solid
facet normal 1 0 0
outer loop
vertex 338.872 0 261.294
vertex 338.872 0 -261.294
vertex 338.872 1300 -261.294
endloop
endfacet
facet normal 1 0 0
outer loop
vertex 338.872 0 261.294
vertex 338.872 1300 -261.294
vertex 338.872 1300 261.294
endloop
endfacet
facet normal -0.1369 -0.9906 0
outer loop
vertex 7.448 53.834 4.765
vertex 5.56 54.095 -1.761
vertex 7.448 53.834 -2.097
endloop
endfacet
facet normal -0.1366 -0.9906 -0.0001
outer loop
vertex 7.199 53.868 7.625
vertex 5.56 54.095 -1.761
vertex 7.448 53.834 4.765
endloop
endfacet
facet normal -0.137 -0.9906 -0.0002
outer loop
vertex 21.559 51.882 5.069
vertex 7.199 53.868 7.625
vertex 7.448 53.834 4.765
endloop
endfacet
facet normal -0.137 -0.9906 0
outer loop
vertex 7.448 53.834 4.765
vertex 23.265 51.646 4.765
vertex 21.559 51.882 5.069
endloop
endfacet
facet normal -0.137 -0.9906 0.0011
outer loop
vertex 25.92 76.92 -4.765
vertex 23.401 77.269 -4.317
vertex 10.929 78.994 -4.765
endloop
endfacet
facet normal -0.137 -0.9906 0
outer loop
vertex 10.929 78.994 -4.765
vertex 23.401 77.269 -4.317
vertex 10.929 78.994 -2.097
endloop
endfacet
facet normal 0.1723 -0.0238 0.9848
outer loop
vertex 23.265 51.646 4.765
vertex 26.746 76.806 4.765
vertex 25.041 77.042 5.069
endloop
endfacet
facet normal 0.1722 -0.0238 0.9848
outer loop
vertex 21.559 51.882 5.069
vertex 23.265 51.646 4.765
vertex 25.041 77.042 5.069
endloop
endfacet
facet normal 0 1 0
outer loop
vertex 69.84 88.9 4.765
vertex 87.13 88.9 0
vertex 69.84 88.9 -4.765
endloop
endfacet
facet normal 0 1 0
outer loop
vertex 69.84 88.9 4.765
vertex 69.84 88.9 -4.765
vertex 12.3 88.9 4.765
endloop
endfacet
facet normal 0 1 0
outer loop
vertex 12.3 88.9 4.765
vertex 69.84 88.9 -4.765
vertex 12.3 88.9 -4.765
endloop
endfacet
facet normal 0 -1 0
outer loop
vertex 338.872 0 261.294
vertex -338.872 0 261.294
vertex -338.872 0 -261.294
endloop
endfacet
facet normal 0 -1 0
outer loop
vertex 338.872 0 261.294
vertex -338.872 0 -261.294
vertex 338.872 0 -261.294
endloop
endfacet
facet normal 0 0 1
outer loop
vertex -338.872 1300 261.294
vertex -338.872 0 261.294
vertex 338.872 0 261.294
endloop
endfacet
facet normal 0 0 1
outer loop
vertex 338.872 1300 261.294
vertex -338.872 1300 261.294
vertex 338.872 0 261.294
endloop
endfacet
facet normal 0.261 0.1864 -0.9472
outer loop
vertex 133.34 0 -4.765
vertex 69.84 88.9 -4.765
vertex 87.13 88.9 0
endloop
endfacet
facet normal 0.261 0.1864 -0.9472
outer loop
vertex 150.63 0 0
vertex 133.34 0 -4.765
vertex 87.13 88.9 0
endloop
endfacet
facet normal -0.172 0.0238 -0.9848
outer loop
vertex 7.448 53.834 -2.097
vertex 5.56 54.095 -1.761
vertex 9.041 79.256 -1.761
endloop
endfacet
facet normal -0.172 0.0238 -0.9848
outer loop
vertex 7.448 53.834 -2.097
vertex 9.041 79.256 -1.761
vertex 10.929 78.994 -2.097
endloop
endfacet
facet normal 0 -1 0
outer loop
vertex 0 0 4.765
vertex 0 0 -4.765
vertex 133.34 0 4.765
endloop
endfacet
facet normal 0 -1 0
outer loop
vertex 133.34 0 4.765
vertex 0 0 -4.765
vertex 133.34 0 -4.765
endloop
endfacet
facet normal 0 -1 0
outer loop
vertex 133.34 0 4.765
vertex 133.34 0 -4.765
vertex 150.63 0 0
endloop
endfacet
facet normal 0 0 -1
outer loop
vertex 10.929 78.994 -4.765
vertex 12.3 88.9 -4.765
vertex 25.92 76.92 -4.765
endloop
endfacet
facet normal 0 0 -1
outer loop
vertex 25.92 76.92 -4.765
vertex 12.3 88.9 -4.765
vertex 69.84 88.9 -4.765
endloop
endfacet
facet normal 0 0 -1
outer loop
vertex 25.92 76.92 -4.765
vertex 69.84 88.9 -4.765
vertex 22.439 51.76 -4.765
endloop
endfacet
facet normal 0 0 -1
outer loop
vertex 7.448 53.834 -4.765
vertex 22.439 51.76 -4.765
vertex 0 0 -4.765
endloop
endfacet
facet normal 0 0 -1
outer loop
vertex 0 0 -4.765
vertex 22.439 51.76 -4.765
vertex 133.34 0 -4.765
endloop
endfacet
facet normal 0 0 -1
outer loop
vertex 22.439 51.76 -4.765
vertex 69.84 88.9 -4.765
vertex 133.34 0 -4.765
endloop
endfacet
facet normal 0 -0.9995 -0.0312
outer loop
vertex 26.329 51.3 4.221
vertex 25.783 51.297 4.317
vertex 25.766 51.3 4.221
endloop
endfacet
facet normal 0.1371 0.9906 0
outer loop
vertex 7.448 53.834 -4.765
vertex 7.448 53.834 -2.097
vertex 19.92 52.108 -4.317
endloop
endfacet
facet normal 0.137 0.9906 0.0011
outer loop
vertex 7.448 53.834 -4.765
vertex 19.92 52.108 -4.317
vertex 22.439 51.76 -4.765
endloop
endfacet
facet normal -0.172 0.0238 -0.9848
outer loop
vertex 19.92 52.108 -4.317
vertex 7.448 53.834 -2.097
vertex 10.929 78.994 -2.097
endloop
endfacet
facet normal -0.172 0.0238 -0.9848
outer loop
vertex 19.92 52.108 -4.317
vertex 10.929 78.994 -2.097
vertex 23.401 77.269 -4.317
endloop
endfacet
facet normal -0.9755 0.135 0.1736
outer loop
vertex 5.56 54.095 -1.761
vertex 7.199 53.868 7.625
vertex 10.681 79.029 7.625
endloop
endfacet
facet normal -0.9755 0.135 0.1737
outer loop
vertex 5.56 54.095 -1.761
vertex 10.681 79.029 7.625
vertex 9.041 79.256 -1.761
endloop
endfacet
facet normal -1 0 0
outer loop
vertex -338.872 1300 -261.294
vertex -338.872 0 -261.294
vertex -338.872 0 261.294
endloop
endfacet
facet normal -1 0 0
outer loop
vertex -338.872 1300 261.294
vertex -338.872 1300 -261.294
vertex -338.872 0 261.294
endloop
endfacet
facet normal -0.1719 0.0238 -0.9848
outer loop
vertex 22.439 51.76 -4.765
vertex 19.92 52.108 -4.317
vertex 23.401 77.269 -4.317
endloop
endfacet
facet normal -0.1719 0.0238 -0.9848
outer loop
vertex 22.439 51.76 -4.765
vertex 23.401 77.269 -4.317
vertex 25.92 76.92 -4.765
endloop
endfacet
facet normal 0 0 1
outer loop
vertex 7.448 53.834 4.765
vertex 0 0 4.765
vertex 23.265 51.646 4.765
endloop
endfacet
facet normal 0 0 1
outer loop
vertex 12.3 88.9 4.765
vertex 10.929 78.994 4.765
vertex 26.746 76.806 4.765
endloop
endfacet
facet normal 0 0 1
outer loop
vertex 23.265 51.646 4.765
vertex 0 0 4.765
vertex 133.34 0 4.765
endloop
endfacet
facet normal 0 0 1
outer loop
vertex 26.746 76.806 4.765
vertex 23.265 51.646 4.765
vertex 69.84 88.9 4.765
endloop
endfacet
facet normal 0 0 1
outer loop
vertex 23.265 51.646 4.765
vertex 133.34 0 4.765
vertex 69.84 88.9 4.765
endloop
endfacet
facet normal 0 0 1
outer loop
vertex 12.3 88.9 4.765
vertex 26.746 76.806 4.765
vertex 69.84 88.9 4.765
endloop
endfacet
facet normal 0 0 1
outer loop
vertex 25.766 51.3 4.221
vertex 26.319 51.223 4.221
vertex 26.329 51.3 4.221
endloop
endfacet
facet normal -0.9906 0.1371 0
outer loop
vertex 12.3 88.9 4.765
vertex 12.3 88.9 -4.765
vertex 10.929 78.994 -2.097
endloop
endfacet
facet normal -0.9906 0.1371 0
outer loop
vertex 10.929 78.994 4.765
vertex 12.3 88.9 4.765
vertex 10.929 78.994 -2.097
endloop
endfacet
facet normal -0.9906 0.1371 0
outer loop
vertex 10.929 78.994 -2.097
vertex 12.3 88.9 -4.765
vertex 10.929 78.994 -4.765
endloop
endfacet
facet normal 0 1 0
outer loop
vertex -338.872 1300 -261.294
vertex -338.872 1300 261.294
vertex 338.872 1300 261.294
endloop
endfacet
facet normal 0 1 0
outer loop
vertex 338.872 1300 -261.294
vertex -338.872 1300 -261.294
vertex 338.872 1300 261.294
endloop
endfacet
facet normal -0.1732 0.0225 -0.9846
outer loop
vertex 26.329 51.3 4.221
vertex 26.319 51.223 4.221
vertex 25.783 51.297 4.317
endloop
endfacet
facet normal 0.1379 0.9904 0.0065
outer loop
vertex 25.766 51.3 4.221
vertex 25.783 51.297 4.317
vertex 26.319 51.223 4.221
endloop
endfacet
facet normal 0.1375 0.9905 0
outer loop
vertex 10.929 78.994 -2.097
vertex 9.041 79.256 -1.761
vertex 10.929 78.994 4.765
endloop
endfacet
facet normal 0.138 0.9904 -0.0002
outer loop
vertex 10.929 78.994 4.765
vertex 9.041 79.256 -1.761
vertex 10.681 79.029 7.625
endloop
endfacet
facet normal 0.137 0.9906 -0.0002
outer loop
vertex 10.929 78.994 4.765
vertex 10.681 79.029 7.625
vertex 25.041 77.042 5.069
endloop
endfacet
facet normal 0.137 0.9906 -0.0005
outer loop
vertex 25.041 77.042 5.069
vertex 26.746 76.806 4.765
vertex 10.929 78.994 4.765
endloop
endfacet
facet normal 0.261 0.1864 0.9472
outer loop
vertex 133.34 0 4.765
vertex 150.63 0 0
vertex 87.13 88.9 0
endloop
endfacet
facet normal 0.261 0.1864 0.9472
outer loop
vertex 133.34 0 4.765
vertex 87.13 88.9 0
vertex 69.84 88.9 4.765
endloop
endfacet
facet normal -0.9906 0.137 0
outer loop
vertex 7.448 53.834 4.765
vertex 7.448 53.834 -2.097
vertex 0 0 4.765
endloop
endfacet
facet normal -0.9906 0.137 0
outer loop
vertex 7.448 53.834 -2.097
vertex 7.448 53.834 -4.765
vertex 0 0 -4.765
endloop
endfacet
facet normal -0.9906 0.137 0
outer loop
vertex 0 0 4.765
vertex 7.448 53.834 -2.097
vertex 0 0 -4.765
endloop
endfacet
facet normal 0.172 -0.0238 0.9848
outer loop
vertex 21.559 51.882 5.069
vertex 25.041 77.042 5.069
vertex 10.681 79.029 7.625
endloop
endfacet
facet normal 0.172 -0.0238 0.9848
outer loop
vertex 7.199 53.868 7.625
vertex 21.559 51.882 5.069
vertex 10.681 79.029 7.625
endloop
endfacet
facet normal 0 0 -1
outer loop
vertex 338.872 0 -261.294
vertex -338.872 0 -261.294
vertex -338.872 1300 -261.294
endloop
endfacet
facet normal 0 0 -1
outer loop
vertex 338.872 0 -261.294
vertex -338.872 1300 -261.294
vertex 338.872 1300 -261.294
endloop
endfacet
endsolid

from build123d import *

# Parameters (mm, degrees)
BOSS_EXTRUDE1_DEPTH      = 4.765
BOSS_EXTRUDE1_DEPTH_BACK = 4.765
CUT_EXTRUDE1_DEPTH       = 134.257142857
CUT_EXTRUDE2_DEPTH       = 176.166857025
BOSS_EXTRUDE2_DEPTH      = 25.4
BOSS_EXTRUDE3_REACH      = 168.247
BOSS_EXTRUDE4_REACH      = 162.602
CUT_EXTRUDE4_DEPTH       = 176.073535498
CUT_EXTRUDE4_DEPTH_BACK  = 176.073535498
SKETCH8_W                = 29.497845824
SKETCH8_H                = 11.821808138
BOSS_EXTRUDE5_REACH      = 162.602
SKETCH10_W               = 677.744852518
SKETCH10_H               = 522.587521888
BOSS_EXTRUDE6_DEPTH      = 1300


with BuildPart() as part:
    # Sketch1 → Boss-Extrude1 (new, two sides: drawn at the far end of the back side and taken through both)
    with BuildSketch(Plane.XY.offset(-BOSS_EXTRUDE1_DEPTH_BACK)):
        Polygon((0, 0), (150.63, 0), (87.13, 88.9), (12.3, 88.9), align=None)
    extrude(amount=BOSS_EXTRUDE1_DEPTH + BOSS_EXTRUDE1_DEPTH_BACK)

    # Sketch2 → Cut-Extrude1 (cut, along a direction that is not the sketch's normal)
    with BuildSketch(Plane.XZ):
        Polygon((150.63, 0), (133.34, 4.765), (171.670273927, 17.698707495), (171.005533739, -7.644512157), (148.071997267, -23.348999089), (133.34, -4.765), align=None)
    extrude(amount=-CUT_EXTRUDE1_DEPTH, dir=(0.5812381937190965, -0.8137334712067349, 0), mode=Mode.SUBTRACT)

    # Sketch3 → Cut-Extrude2 (cut, through all)
    with BuildSketch(Plane.XY.offset(4.765)):
        Polygon((29.799719665, 76.3835184), (10.929478609, 78.99436165), (7.448354274, 53.834040242), (26.31859533, 51.223196991), align=None)
    extrude(amount=-CUT_EXTRUDE2_DEPTH, mode=Mode.SUBTRACT)

    # Sketch4 → Boss-Extrude2 (add)
    with BuildSketch(Plane(origin=(10.929478609, 78.99436165, 0), x_dir=(0.9905638349724135, -0.1370521391469141, 0), z_dir=(-0.1370521391469141, -0.9905638349724135, 0))):
        Polygon((-1.906104256, -1.760525647), (0, -2.096623256), (0, 4.765), (14.191997191, 4.765), (14.245516561, 5.068523432), (-0.251237123, 7.624692239), align=None)
        with BuildLine():
            Line((0, -2.096623256), (12.590649428, -4.316694454))
            Line((12.590649428, -4.316694454), (12.940515204, -2.332507041))
            ThreePointArc((12.940515204, -2.332507041), (12.103172864, 0.607768622), (13.895650785, 3.084336019))
            Line((13.895650785, 3.084336019), (14.191997191, 4.765))
            Line((14.191997191, 4.765), (0, 4.765))
            Line((0, 4.765), (0, -2.096623256))
        make_face()
        with BuildLine():
            ThreePointArc((13.895650785, 3.084336019), (12.103172864, 0.607768622), (12.940515204, -2.332507041))
            Line((12.940515204, -2.332507041), (13.895650785, 3.084336019))
        make_face()
        with BuildLine():
            ThreePointArc((12.940515204, -2.332507041), (14.942231378, -3.446827136), (17.204349215, -3.084336019))
            Line((17.204349215, -3.084336019), (18.159484796, 2.332507041))
            ThreePointArc((18.159484796, 2.332507041), (16.157768622, 3.446827136), (13.895650785, 3.084336019))
            Line((13.895650785, 3.084336019), (12.940515204, -2.332507041))
        make_face()
        with BuildLine():
            ThreePointArc((13.895650785, 3.084336019), (16.157768622, 3.446827136), (18.159484796, 2.332507041))
            Line((18.159484796, 2.332507041), (18.509350572, 4.316694454))
            Line((18.509350572, 4.316694454), (15.966883482, 4.765))
            Line((15.966883482, 4.765), (14.191997191, 4.765))
            Line((14.191997191, 4.765), (13.895650785, 3.084336019))
        make_face()
        Polygon((14.245516561, 5.068523432), (14.191997191, 4.765), (15.966883482, 4.765), align=None)
        with BuildLine():
            Line((12.590649428, -4.316694454), (15.133116518, -4.765))
            Line((15.133116518, -4.765), (16.908002809, -4.765))
            Line((16.908002809, -4.765), (17.204349215, -3.084336019))
            ThreePointArc((17.204349215, -3.084336019), (14.942231378, -3.446827136), (12.940515204, -2.332507041))
            Line((12.940515204, -2.332507041), (12.590649428, -4.316694454))
        make_face()
        Polygon((15.133116518, -4.765), (16.854483439, -5.068523432), (16.908002809, -4.765), align=None)
    extrude(amount=BOSS_EXTRUDE2_DEPTH)

    # Boss-Extrude3: up to this plane
    boss_extrude3_end = Plane(origin=(18.870241056, -2.610843251, -4.765), z_dir=(-0.9905638349724135, 0.13705213914691478, 0))
    # Sketch5 → Boss-Extrude3 (add, up to the surface)
    with BuildSketch(Plane(origin=(17.050602168, -2.35908219, -3.035121103), x_dir=(-0.1720096048057269, 0.02379885420821639, -0.9848077530122078), z_dir=(0.9755149445343381, -0.134970009198789, -0.17364817766693175)), mode=Mode.PRIVATE) as boss_extrude3_sk1:
        Polygon((1.756565067, 54.346866241), (2.064770837, 54.346866241), (2.064770837, 79.746866241), (1.756565067, 79.746866241), (-7.465229163, 79.746866241), (-7.465229163, 54.346866241), align=None)
    boss_extrude3_tool1 = split(extrude(boss_extrude3_sk1.sketch, amount=BOSS_EXTRUDE3_REACH, dir=(1, 0, 0), mode=Mode.PRIVATE), bisect_by=boss_extrude3_end, keep=Keep.BOTH, mode=Mode.PRIVATE)
    add(boss_extrude3_tool1.solids().sort_by_distance((26.703984, 63.990856, -0.375914))[0])

    # Boss-Extrude4: up to this face of the body (flat: up to its plane)
    boss_extrude4_end = Plane(part.part.faces().sort_by_distance((18.23182988, 65.163044194, 5.970693347))[0])
    # Sketch6 → Boss-Extrude4 (add, up to the picked face)
    with BuildSketch(Plane(origin=(18.870241056, -2.610843251, 0), x_dir=(0, 0, 1), z_dir=(-0.9905638349724135, 0.1370521391469148, 0)), mode=Mode.PRIVATE) as boss_extrude4_sk1:
        Polygon((4.765, 79.746866241), (4.316694454, 79.746866241), (4.316694454, 54.421669255), (-4.765, 54.643228057), (-4.765, 54.346866241), (4.765, 54.346866241), align=None)
    boss_extrude4_tool1 = split(extrude(boss_extrude4_sk1.sketch, amount=BOSS_EXTRUDE4_REACH, mode=Mode.PRIVATE), bisect_by=boss_extrude4_end, keep=Keep.BOTH, mode=Mode.PRIVATE)
    add(boss_extrude4_tool1.solids().sort_by(Axis((29.762539, 76.114789, 4.540847), (-0.9905638349724135, 0.1370521391469148, 0)))[0])

    # Sketch8 → Cut-Extrude4 (cut, two sides: drawn at the far end of the back side and taken through both)
    with BuildSketch(Plane(origin=(0, 88.9, 0), x_dir=(1, 0, 0), z_dir=(0, 1, 0)).offset(-CUT_EXTRUDE4_DEPTH_BACK)):
        with Locations((33.561006967, 10.675904069)):
            Rectangle(SKETCH8_W, SKETCH8_H)
    extrude(amount=CUT_EXTRUDE4_DEPTH + CUT_EXTRUDE4_DEPTH_BACK, mode=Mode.SUBTRACT)

    # Sketch9 → Boss-Extrude5 (add, up to next)
    with BuildSketch(Plane(origin=(18.870241056, -2.610843251, 0), x_dir=(0, 0, 1), z_dir=(-0.9905638349724135, 0.1370521391469148, 0)), mode=Mode.PRIVATE) as boss_extrude5_sk1:
        Polygon((4.221363373, 54.346866241), (4.221363373, 54.423994971), (-4.765, 54.643228057), (-4.765, 54.346866241), align=None)
    boss_extrude5_tool1 = extrude(boss_extrude5_sk1.sketch, amount=BOSS_EXTRUDE5_REACH, mode=Mode.PRIVATE) - part.part
    add(boss_extrude5_tool1.solids().sort_by_distance((26.332862, 51.326311, -1.150961))[0])


with BuildPart() as body_2:
    # Sketch10 → Boss-Extrude6 (new body)
    # profile 1 of 2: a face of its own
    with BuildSketch(Plane.XZ):
        Rectangle(SKETCH10_W, SKETCH10_H)
        Polygon((150.63, 0), (133.34, 4.765), (0, 4.765), (0, -4.765), (133.34, -4.765), align=None, mode=Mode.SUBTRACT)
    # profile 2 of 2: a face of its own
    with BuildSketch(Plane.XZ):
        Polygon((133.34, -4.765), (150.63, 0), (133.34, 4.765), (0, 4.765), (0, -4.765), align=None)
    extrude(amount=-BOSS_EXTRUDE6_DEPTH)


solid = Compound([part.part, body_2.part])
